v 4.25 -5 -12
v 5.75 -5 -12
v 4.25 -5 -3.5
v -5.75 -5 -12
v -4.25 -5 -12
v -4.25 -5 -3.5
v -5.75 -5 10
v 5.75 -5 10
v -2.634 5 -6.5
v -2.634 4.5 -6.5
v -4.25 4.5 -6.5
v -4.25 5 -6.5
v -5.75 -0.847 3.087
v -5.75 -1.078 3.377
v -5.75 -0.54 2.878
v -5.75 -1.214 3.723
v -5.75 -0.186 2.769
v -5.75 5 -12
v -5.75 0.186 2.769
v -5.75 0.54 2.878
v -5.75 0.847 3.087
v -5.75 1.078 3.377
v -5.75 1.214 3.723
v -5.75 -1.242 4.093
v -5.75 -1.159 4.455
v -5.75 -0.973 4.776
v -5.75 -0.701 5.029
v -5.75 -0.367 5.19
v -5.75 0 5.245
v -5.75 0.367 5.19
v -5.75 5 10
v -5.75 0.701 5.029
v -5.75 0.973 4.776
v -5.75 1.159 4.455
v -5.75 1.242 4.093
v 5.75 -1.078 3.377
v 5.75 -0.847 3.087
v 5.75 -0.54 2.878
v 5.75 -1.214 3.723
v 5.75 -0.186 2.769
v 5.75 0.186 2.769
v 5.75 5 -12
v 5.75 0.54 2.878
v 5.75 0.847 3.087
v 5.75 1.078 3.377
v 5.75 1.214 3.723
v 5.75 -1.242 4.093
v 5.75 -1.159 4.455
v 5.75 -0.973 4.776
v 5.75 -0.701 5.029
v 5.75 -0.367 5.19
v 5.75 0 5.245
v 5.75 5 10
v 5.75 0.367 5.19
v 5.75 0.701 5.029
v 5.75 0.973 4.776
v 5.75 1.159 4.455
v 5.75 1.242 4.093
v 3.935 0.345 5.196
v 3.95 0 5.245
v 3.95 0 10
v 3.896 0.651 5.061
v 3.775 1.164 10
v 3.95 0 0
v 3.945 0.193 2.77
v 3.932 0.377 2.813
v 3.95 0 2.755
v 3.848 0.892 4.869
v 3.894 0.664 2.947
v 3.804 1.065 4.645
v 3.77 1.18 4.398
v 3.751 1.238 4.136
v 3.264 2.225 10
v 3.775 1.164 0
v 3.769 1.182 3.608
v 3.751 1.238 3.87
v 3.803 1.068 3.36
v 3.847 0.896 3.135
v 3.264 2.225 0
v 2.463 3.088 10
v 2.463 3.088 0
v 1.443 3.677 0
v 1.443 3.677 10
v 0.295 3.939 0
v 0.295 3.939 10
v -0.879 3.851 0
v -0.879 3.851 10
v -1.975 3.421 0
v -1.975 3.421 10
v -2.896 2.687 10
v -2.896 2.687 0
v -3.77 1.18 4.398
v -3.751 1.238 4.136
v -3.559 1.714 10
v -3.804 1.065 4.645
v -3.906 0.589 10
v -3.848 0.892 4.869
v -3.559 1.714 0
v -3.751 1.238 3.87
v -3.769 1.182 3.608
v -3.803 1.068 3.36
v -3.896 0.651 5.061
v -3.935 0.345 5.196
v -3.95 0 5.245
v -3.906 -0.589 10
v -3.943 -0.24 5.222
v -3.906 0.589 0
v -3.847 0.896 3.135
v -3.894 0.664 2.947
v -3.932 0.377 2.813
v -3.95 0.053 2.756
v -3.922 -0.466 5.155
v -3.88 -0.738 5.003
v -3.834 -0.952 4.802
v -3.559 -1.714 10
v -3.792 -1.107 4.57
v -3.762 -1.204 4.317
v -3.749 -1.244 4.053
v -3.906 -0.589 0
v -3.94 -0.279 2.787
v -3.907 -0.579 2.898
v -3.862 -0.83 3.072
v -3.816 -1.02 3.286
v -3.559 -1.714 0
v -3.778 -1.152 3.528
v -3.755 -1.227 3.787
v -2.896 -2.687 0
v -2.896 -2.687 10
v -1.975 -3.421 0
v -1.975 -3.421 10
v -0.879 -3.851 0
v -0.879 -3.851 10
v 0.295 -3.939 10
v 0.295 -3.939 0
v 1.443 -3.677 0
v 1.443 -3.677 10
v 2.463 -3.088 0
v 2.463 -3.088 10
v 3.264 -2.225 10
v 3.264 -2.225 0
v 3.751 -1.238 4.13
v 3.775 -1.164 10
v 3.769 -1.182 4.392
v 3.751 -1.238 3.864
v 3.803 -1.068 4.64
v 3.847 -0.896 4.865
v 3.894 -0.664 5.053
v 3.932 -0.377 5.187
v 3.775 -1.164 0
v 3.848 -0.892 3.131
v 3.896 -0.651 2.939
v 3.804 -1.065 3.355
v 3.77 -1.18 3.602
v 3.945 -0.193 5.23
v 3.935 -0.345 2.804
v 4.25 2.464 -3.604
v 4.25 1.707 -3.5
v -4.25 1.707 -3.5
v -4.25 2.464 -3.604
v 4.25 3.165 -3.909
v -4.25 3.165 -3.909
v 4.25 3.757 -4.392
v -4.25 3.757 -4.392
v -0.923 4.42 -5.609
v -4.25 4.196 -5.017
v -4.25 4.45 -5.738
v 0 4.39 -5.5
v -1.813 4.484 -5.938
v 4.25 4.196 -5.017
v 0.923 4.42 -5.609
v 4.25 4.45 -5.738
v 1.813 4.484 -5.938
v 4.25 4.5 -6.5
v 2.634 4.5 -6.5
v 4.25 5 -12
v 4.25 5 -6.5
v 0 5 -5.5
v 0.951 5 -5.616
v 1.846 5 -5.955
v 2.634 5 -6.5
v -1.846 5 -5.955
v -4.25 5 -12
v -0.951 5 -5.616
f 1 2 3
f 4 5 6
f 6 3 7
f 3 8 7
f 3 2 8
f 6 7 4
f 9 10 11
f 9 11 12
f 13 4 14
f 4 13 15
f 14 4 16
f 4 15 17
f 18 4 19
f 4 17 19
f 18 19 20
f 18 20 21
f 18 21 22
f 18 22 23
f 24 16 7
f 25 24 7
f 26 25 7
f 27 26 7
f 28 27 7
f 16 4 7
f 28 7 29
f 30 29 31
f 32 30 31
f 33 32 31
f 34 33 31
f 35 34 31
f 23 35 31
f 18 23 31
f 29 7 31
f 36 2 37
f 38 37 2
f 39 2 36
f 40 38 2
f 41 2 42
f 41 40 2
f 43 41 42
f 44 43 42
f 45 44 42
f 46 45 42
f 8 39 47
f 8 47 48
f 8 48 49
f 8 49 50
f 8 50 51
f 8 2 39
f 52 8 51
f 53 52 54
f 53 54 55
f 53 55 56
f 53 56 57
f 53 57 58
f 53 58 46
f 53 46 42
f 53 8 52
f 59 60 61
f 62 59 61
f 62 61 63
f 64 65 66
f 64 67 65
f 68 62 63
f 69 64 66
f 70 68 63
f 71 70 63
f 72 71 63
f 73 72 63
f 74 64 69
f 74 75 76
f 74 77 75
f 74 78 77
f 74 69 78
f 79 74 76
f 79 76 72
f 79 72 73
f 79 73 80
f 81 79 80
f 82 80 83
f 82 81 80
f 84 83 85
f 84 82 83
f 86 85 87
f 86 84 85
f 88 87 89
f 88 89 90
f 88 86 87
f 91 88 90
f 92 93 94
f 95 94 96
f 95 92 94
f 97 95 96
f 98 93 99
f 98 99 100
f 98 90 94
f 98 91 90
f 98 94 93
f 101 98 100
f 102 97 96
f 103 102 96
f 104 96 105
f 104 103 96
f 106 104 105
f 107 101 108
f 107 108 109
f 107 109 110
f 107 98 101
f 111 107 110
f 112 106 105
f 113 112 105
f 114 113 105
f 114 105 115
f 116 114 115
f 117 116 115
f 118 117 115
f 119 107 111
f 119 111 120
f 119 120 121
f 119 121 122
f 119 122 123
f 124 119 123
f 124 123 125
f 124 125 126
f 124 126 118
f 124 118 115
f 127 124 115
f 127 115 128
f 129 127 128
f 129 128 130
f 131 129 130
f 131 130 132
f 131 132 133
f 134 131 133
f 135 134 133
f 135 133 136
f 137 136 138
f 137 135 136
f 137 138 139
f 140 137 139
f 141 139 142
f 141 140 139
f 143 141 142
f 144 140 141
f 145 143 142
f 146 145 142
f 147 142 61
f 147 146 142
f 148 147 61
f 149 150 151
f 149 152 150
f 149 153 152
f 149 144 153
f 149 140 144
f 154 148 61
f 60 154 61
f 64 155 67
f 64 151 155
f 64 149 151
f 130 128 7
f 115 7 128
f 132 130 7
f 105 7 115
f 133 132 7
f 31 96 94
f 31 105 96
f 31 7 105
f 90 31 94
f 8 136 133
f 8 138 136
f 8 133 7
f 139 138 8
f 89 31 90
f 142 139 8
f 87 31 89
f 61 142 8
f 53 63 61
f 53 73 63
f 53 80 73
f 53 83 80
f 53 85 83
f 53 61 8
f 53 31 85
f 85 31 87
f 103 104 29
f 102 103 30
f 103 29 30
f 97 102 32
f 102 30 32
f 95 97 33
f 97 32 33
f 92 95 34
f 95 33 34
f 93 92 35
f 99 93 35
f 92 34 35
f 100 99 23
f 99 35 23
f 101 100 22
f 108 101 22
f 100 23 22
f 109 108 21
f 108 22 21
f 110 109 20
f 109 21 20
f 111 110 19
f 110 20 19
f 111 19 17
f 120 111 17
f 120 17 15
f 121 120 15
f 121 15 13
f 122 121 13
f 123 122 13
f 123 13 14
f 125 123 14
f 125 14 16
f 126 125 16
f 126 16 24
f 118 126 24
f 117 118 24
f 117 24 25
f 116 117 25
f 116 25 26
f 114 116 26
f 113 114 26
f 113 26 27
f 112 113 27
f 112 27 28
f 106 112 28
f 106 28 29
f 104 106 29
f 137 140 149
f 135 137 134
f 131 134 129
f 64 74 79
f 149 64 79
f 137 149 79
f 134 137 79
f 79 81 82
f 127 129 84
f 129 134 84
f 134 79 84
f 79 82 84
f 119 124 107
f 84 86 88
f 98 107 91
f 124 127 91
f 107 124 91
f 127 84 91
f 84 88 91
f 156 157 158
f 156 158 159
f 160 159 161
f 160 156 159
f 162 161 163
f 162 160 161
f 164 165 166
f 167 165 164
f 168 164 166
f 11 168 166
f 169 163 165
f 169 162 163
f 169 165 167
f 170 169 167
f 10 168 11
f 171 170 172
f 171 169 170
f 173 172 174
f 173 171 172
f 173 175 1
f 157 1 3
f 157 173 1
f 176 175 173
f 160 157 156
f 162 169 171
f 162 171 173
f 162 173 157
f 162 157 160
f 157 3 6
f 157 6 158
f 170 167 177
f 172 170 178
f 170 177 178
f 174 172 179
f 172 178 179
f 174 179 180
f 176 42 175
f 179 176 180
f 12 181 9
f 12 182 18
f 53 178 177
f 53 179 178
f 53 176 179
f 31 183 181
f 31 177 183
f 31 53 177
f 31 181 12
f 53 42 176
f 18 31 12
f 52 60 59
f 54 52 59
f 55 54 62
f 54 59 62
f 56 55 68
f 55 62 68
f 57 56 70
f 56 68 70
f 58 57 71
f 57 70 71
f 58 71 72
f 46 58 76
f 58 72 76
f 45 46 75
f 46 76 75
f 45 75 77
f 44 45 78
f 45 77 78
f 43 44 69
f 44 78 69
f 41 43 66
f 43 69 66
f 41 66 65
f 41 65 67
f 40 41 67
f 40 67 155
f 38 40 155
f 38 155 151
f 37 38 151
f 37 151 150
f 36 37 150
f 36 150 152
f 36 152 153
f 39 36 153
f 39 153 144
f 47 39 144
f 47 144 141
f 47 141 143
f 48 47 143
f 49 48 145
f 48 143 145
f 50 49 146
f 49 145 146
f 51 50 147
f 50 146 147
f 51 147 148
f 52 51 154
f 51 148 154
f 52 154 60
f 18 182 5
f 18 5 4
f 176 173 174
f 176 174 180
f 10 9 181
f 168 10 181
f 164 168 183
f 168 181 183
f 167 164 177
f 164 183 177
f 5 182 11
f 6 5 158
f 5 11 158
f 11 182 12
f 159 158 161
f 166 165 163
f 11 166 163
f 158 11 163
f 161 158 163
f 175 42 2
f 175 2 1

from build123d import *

# Parameters (mm, degrees)
SKETCH1_W               = 11.5
SKETCH1_H               = 10
SKETCH1_R               = 3.95
BOSS_EXTRUDE1_DEPTH     = 10
SKETCH2_W               = 11.5
SKETCH2_H               = 10
BOSS_EXTRUDE2_DEPTH     = 12
CUT_EXTRUDE1_DEPTH      = 4.25
CUT_EXTRUDE1_DEPTH_BACK = 4.25
SKETCH4_R               = 1.245
CUT_EXTRUDE2_DEPTH      = 18.356554958
CUT_EXTRUDE3_DEPTH      = 17.645194536


with BuildPart() as part:
    # Sketch1 → Boss-Extrude1 (new body)
    with BuildSketch(Plane.XY):
        Rectangle(SKETCH1_W, SKETCH1_H)
        Circle(SKETCH1_R, mode=Mode.SUBTRACT)
    extrude(amount=BOSS_EXTRUDE1_DEPTH)

    # Sketch2 → Boss-Extrude2 (add)
    with BuildSketch(Plane(origin=(0, 0, 0), x_dir=(-1, 0, 0), z_dir=(0, 0, -1))):
        Rectangle(SKETCH2_W, SKETCH2_H)
    extrude(amount=BOSS_EXTRUDE2_DEPTH)

    # Sketch3 → Cut-Extrude1 (cut, two sides: drawn at the far end of the back side and taken through both)
    with BuildSketch(Plane.ZY.offset(-CUT_EXTRUDE1_DEPTH_BACK)):
        with BuildLine():
            Line((-12, -5), (-3.5, -5))
            Line((-3.5, -5), (-3.5, 1.707151991))
            ThreePointArc((-3.5, 1.707151991), (-4.392121597, 3.756542144), (-6.5, 4.5))
            Line((-6.5, 4.5), (-6.5, 5))
            Line((-6.5, 5), (-12, 5))
            Line((-12, 5), (-12, -5))
        make_face()
    extrude(amount=CUT_EXTRUDE1_DEPTH + CUT_EXTRUDE1_DEPTH_BACK, mode=Mode.SUBTRACT)

    # Sketch4 → Cut-Extrude2 (cut, through all)
    with BuildSketch(Plane.ZY.offset(5.75)):
        with Locations((4, 0)):
            Circle(SKETCH4_R)
    extrude(amount=-CUT_EXTRUDE2_DEPTH, mode=Mode.SUBTRACT)

    # Sketch5 → Cut-Extrude3 (cut, through all)
    with BuildSketch(Plane(origin=(0, 5, 0), x_dir=(1, 0, 0), z_dir=(0, 1, 0))):
        with BuildLine():
            ThreePointArc((-2.633913438, 6.5), (-1.408678459, 5.758412878), (0, 5.5))
            Line((0, 5.5), (0, 6.5))
            Line((0, 6.5), (-2.633913438, 6.5))
        make_face()
        with BuildLine():
            Line((0, 6.5), (0, 5.5))
            ThreePointArc((0, 5.5), (1.408678459, 5.758412878), (2.633913438, 6.5))
            Line((2.633913438, 6.5), (0, 6.5))
        make_face()
        with BuildLine():
            Line((-2.633913438, 6.5), (0, 6.5))
            Line((0, 6.5), (2.633913438, 6.5))
            ThreePointArc((2.633913438, 6.5), (3.61969063, 7.841231551), (3.96875, 9.46875))
            ThreePointArc((3.96875, 9.46875), (-1.627518449, 13.08844063), (-2.633913438, 6.5))
        make_face()
    extrude(amount=-CUT_EXTRUDE3_DEPTH, mode=Mode.SUBTRACT)


solid = part.part
